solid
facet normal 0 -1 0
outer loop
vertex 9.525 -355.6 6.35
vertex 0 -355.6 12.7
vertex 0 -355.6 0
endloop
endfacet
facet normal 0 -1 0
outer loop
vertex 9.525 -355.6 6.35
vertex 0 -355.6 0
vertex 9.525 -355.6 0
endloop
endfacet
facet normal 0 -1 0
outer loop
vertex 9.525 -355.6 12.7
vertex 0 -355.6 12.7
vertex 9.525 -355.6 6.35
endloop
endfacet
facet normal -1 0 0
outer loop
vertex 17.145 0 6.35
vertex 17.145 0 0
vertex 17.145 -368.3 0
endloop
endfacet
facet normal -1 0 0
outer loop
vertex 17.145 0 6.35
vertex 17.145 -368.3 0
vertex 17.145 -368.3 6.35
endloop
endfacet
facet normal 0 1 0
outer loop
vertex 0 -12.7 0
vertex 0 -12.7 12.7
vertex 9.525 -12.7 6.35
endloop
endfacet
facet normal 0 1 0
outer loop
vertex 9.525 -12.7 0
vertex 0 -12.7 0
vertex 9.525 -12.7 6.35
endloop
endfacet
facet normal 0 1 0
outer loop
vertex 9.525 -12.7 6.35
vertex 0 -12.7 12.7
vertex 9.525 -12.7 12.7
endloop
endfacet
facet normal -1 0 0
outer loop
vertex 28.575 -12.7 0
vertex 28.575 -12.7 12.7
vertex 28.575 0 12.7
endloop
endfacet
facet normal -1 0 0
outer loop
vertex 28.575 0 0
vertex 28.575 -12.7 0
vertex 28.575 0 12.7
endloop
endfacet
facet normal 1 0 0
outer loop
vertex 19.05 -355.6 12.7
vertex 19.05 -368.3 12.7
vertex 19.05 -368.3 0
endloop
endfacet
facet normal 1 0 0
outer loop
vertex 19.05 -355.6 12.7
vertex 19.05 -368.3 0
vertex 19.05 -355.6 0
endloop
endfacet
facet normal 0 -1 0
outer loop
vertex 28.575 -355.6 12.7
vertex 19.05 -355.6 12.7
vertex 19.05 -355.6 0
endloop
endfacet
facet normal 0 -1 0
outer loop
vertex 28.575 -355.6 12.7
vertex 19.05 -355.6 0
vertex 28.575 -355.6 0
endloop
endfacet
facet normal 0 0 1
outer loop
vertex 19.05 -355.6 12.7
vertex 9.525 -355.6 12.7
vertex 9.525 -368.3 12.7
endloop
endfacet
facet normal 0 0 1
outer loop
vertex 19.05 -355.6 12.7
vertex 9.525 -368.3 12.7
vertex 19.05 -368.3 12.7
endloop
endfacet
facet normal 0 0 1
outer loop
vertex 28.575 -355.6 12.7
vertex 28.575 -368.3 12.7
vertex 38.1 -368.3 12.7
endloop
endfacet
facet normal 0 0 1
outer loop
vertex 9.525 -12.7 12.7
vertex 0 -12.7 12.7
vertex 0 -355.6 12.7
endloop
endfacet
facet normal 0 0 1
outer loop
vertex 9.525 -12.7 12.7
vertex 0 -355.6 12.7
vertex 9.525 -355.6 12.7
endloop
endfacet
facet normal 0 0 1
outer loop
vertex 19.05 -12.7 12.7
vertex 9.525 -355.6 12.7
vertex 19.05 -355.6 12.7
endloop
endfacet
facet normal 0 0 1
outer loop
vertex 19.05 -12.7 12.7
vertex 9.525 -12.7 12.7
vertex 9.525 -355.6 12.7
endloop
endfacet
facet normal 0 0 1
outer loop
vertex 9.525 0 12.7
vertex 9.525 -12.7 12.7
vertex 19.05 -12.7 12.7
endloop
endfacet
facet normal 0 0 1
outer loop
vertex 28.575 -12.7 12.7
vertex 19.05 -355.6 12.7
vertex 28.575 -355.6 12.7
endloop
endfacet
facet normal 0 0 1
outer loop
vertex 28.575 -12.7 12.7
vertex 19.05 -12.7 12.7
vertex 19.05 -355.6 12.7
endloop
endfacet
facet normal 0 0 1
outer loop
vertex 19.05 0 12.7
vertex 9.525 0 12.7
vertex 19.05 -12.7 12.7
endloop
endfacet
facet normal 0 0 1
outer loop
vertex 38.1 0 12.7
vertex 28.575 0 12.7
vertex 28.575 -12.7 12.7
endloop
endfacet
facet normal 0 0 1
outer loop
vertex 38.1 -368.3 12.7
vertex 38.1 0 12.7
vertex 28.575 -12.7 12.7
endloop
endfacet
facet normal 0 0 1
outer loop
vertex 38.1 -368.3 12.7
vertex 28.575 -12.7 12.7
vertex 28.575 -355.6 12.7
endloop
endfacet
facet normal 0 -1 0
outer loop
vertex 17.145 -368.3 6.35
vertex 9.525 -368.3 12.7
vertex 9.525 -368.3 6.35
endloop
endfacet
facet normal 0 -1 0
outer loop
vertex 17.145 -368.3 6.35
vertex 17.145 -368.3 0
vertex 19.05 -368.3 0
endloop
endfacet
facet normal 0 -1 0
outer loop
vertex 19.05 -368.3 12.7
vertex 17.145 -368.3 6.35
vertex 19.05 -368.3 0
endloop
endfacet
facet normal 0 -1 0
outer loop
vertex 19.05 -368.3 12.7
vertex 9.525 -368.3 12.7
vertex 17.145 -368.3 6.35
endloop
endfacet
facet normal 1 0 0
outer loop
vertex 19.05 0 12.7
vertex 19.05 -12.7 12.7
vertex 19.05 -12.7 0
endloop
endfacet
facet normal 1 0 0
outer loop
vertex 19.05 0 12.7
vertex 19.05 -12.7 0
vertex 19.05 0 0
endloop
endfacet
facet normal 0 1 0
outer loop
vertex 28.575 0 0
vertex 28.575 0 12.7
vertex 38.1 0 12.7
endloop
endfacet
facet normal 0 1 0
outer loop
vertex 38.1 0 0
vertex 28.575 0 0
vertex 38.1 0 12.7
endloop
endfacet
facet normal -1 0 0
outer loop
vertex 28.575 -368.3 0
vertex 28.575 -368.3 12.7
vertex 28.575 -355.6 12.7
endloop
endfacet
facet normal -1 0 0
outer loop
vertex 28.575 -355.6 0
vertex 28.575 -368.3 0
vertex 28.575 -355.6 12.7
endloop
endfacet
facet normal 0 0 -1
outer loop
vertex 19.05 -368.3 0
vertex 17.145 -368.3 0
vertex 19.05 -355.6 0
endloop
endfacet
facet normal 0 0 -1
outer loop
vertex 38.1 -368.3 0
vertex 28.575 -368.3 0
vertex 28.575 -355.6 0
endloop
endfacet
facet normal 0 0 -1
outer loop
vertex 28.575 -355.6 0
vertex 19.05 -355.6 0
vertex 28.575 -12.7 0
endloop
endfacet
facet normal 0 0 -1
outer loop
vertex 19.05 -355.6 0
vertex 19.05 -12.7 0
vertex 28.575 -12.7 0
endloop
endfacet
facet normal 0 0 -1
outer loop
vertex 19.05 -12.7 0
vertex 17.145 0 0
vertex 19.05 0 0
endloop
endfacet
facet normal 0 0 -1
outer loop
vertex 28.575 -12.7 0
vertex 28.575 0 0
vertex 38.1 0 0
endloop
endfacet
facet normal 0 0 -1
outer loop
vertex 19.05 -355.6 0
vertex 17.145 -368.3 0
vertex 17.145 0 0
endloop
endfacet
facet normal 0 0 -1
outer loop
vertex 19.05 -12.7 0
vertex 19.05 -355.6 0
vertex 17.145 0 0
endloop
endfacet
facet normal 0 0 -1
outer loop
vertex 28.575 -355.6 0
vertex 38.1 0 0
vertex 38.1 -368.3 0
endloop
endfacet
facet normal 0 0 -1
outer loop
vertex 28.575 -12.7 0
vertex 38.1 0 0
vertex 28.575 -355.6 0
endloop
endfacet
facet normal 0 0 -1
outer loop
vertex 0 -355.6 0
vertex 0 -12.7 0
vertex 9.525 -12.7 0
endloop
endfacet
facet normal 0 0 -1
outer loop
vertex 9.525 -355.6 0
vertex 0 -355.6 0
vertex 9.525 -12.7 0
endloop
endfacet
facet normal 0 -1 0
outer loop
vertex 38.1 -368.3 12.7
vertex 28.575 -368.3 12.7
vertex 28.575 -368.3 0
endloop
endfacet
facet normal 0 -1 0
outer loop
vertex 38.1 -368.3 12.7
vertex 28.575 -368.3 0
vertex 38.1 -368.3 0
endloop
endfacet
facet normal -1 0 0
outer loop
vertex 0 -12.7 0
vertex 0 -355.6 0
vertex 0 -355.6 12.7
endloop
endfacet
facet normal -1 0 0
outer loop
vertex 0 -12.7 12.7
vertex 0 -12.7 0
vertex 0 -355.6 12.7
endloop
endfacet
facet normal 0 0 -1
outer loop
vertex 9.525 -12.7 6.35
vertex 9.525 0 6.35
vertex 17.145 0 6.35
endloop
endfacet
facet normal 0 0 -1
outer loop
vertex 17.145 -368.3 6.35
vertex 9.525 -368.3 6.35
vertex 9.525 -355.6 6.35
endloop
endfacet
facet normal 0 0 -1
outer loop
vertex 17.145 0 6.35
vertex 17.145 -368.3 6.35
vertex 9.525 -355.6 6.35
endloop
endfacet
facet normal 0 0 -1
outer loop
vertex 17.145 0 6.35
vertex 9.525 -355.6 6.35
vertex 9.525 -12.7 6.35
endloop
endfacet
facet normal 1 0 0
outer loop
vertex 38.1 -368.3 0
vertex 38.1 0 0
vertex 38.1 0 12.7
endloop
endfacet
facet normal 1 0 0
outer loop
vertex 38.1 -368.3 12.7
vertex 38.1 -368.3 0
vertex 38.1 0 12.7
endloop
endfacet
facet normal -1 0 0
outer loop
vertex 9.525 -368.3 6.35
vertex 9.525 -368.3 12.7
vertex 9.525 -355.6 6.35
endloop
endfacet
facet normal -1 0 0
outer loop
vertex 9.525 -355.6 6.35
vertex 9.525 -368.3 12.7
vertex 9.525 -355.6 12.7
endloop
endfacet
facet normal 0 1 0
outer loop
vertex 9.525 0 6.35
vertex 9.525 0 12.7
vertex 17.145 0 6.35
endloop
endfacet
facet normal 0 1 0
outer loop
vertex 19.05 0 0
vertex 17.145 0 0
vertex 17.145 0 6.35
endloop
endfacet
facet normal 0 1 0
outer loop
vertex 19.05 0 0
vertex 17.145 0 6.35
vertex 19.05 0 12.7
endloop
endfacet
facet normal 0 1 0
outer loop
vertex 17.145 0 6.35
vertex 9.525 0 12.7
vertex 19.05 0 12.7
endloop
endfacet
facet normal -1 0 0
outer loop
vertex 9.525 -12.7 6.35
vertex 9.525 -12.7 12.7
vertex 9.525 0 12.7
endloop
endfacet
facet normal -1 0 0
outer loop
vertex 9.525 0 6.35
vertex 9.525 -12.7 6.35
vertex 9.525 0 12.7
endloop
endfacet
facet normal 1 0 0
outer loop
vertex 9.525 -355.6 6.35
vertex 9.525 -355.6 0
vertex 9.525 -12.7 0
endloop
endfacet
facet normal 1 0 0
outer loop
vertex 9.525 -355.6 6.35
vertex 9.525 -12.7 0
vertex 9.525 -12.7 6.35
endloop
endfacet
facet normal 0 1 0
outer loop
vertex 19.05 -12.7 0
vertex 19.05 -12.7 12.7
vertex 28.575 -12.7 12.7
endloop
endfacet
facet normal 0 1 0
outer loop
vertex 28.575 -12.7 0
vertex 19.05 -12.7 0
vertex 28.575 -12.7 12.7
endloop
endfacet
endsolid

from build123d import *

# Parameters (mm, degrees)
F0_W     = 38.1
F0_H     = 12.7
F1_DEPTH = 368.3
F2_W     = 7.62
F2_H     = 6.35
F3_DEPTH = 368.301
F4_W     = 9.525
F4_H     = 12.7
F5_DEPTH = 25.4


with BuildPart() as f1:
    # F0 (on Front) → F1 (new body)
    with BuildSketch(Plane.XZ):
        with Locations((19.05, 6.35)):
            Rectangle(F0_W, F0_H)
    extrude(amount=F1_DEPTH)

    # F2 (on face) → F3 (cut, through all)
    with BuildSketch(Plane.XZ.offset(368.3)):
        with Locations((13.335, 3.175)):
            Rectangle(F2_W, F2_H)
    extrude(amount=-F3_DEPTH, mode=Mode.SUBTRACT)

    # F4 (on face) → F5 (cut)
    with BuildSketch(Plane.XY.offset(12.7)):
        with Locations((23.8125, -6.35)):
            Rectangle(F4_W, F4_H)
        with Locations((4.7625, -6.35)):
            Rectangle(F4_W, F4_H)
        with Locations((4.7625, -361.95)):
            Rectangle(F4_W, F4_H)
        with Locations((23.8125, -361.95)):
            Rectangle(F4_W, F4_H)
    extrude(amount=-F5_DEPTH, mode=Mode.SUBTRACT)


solid = f1.part
